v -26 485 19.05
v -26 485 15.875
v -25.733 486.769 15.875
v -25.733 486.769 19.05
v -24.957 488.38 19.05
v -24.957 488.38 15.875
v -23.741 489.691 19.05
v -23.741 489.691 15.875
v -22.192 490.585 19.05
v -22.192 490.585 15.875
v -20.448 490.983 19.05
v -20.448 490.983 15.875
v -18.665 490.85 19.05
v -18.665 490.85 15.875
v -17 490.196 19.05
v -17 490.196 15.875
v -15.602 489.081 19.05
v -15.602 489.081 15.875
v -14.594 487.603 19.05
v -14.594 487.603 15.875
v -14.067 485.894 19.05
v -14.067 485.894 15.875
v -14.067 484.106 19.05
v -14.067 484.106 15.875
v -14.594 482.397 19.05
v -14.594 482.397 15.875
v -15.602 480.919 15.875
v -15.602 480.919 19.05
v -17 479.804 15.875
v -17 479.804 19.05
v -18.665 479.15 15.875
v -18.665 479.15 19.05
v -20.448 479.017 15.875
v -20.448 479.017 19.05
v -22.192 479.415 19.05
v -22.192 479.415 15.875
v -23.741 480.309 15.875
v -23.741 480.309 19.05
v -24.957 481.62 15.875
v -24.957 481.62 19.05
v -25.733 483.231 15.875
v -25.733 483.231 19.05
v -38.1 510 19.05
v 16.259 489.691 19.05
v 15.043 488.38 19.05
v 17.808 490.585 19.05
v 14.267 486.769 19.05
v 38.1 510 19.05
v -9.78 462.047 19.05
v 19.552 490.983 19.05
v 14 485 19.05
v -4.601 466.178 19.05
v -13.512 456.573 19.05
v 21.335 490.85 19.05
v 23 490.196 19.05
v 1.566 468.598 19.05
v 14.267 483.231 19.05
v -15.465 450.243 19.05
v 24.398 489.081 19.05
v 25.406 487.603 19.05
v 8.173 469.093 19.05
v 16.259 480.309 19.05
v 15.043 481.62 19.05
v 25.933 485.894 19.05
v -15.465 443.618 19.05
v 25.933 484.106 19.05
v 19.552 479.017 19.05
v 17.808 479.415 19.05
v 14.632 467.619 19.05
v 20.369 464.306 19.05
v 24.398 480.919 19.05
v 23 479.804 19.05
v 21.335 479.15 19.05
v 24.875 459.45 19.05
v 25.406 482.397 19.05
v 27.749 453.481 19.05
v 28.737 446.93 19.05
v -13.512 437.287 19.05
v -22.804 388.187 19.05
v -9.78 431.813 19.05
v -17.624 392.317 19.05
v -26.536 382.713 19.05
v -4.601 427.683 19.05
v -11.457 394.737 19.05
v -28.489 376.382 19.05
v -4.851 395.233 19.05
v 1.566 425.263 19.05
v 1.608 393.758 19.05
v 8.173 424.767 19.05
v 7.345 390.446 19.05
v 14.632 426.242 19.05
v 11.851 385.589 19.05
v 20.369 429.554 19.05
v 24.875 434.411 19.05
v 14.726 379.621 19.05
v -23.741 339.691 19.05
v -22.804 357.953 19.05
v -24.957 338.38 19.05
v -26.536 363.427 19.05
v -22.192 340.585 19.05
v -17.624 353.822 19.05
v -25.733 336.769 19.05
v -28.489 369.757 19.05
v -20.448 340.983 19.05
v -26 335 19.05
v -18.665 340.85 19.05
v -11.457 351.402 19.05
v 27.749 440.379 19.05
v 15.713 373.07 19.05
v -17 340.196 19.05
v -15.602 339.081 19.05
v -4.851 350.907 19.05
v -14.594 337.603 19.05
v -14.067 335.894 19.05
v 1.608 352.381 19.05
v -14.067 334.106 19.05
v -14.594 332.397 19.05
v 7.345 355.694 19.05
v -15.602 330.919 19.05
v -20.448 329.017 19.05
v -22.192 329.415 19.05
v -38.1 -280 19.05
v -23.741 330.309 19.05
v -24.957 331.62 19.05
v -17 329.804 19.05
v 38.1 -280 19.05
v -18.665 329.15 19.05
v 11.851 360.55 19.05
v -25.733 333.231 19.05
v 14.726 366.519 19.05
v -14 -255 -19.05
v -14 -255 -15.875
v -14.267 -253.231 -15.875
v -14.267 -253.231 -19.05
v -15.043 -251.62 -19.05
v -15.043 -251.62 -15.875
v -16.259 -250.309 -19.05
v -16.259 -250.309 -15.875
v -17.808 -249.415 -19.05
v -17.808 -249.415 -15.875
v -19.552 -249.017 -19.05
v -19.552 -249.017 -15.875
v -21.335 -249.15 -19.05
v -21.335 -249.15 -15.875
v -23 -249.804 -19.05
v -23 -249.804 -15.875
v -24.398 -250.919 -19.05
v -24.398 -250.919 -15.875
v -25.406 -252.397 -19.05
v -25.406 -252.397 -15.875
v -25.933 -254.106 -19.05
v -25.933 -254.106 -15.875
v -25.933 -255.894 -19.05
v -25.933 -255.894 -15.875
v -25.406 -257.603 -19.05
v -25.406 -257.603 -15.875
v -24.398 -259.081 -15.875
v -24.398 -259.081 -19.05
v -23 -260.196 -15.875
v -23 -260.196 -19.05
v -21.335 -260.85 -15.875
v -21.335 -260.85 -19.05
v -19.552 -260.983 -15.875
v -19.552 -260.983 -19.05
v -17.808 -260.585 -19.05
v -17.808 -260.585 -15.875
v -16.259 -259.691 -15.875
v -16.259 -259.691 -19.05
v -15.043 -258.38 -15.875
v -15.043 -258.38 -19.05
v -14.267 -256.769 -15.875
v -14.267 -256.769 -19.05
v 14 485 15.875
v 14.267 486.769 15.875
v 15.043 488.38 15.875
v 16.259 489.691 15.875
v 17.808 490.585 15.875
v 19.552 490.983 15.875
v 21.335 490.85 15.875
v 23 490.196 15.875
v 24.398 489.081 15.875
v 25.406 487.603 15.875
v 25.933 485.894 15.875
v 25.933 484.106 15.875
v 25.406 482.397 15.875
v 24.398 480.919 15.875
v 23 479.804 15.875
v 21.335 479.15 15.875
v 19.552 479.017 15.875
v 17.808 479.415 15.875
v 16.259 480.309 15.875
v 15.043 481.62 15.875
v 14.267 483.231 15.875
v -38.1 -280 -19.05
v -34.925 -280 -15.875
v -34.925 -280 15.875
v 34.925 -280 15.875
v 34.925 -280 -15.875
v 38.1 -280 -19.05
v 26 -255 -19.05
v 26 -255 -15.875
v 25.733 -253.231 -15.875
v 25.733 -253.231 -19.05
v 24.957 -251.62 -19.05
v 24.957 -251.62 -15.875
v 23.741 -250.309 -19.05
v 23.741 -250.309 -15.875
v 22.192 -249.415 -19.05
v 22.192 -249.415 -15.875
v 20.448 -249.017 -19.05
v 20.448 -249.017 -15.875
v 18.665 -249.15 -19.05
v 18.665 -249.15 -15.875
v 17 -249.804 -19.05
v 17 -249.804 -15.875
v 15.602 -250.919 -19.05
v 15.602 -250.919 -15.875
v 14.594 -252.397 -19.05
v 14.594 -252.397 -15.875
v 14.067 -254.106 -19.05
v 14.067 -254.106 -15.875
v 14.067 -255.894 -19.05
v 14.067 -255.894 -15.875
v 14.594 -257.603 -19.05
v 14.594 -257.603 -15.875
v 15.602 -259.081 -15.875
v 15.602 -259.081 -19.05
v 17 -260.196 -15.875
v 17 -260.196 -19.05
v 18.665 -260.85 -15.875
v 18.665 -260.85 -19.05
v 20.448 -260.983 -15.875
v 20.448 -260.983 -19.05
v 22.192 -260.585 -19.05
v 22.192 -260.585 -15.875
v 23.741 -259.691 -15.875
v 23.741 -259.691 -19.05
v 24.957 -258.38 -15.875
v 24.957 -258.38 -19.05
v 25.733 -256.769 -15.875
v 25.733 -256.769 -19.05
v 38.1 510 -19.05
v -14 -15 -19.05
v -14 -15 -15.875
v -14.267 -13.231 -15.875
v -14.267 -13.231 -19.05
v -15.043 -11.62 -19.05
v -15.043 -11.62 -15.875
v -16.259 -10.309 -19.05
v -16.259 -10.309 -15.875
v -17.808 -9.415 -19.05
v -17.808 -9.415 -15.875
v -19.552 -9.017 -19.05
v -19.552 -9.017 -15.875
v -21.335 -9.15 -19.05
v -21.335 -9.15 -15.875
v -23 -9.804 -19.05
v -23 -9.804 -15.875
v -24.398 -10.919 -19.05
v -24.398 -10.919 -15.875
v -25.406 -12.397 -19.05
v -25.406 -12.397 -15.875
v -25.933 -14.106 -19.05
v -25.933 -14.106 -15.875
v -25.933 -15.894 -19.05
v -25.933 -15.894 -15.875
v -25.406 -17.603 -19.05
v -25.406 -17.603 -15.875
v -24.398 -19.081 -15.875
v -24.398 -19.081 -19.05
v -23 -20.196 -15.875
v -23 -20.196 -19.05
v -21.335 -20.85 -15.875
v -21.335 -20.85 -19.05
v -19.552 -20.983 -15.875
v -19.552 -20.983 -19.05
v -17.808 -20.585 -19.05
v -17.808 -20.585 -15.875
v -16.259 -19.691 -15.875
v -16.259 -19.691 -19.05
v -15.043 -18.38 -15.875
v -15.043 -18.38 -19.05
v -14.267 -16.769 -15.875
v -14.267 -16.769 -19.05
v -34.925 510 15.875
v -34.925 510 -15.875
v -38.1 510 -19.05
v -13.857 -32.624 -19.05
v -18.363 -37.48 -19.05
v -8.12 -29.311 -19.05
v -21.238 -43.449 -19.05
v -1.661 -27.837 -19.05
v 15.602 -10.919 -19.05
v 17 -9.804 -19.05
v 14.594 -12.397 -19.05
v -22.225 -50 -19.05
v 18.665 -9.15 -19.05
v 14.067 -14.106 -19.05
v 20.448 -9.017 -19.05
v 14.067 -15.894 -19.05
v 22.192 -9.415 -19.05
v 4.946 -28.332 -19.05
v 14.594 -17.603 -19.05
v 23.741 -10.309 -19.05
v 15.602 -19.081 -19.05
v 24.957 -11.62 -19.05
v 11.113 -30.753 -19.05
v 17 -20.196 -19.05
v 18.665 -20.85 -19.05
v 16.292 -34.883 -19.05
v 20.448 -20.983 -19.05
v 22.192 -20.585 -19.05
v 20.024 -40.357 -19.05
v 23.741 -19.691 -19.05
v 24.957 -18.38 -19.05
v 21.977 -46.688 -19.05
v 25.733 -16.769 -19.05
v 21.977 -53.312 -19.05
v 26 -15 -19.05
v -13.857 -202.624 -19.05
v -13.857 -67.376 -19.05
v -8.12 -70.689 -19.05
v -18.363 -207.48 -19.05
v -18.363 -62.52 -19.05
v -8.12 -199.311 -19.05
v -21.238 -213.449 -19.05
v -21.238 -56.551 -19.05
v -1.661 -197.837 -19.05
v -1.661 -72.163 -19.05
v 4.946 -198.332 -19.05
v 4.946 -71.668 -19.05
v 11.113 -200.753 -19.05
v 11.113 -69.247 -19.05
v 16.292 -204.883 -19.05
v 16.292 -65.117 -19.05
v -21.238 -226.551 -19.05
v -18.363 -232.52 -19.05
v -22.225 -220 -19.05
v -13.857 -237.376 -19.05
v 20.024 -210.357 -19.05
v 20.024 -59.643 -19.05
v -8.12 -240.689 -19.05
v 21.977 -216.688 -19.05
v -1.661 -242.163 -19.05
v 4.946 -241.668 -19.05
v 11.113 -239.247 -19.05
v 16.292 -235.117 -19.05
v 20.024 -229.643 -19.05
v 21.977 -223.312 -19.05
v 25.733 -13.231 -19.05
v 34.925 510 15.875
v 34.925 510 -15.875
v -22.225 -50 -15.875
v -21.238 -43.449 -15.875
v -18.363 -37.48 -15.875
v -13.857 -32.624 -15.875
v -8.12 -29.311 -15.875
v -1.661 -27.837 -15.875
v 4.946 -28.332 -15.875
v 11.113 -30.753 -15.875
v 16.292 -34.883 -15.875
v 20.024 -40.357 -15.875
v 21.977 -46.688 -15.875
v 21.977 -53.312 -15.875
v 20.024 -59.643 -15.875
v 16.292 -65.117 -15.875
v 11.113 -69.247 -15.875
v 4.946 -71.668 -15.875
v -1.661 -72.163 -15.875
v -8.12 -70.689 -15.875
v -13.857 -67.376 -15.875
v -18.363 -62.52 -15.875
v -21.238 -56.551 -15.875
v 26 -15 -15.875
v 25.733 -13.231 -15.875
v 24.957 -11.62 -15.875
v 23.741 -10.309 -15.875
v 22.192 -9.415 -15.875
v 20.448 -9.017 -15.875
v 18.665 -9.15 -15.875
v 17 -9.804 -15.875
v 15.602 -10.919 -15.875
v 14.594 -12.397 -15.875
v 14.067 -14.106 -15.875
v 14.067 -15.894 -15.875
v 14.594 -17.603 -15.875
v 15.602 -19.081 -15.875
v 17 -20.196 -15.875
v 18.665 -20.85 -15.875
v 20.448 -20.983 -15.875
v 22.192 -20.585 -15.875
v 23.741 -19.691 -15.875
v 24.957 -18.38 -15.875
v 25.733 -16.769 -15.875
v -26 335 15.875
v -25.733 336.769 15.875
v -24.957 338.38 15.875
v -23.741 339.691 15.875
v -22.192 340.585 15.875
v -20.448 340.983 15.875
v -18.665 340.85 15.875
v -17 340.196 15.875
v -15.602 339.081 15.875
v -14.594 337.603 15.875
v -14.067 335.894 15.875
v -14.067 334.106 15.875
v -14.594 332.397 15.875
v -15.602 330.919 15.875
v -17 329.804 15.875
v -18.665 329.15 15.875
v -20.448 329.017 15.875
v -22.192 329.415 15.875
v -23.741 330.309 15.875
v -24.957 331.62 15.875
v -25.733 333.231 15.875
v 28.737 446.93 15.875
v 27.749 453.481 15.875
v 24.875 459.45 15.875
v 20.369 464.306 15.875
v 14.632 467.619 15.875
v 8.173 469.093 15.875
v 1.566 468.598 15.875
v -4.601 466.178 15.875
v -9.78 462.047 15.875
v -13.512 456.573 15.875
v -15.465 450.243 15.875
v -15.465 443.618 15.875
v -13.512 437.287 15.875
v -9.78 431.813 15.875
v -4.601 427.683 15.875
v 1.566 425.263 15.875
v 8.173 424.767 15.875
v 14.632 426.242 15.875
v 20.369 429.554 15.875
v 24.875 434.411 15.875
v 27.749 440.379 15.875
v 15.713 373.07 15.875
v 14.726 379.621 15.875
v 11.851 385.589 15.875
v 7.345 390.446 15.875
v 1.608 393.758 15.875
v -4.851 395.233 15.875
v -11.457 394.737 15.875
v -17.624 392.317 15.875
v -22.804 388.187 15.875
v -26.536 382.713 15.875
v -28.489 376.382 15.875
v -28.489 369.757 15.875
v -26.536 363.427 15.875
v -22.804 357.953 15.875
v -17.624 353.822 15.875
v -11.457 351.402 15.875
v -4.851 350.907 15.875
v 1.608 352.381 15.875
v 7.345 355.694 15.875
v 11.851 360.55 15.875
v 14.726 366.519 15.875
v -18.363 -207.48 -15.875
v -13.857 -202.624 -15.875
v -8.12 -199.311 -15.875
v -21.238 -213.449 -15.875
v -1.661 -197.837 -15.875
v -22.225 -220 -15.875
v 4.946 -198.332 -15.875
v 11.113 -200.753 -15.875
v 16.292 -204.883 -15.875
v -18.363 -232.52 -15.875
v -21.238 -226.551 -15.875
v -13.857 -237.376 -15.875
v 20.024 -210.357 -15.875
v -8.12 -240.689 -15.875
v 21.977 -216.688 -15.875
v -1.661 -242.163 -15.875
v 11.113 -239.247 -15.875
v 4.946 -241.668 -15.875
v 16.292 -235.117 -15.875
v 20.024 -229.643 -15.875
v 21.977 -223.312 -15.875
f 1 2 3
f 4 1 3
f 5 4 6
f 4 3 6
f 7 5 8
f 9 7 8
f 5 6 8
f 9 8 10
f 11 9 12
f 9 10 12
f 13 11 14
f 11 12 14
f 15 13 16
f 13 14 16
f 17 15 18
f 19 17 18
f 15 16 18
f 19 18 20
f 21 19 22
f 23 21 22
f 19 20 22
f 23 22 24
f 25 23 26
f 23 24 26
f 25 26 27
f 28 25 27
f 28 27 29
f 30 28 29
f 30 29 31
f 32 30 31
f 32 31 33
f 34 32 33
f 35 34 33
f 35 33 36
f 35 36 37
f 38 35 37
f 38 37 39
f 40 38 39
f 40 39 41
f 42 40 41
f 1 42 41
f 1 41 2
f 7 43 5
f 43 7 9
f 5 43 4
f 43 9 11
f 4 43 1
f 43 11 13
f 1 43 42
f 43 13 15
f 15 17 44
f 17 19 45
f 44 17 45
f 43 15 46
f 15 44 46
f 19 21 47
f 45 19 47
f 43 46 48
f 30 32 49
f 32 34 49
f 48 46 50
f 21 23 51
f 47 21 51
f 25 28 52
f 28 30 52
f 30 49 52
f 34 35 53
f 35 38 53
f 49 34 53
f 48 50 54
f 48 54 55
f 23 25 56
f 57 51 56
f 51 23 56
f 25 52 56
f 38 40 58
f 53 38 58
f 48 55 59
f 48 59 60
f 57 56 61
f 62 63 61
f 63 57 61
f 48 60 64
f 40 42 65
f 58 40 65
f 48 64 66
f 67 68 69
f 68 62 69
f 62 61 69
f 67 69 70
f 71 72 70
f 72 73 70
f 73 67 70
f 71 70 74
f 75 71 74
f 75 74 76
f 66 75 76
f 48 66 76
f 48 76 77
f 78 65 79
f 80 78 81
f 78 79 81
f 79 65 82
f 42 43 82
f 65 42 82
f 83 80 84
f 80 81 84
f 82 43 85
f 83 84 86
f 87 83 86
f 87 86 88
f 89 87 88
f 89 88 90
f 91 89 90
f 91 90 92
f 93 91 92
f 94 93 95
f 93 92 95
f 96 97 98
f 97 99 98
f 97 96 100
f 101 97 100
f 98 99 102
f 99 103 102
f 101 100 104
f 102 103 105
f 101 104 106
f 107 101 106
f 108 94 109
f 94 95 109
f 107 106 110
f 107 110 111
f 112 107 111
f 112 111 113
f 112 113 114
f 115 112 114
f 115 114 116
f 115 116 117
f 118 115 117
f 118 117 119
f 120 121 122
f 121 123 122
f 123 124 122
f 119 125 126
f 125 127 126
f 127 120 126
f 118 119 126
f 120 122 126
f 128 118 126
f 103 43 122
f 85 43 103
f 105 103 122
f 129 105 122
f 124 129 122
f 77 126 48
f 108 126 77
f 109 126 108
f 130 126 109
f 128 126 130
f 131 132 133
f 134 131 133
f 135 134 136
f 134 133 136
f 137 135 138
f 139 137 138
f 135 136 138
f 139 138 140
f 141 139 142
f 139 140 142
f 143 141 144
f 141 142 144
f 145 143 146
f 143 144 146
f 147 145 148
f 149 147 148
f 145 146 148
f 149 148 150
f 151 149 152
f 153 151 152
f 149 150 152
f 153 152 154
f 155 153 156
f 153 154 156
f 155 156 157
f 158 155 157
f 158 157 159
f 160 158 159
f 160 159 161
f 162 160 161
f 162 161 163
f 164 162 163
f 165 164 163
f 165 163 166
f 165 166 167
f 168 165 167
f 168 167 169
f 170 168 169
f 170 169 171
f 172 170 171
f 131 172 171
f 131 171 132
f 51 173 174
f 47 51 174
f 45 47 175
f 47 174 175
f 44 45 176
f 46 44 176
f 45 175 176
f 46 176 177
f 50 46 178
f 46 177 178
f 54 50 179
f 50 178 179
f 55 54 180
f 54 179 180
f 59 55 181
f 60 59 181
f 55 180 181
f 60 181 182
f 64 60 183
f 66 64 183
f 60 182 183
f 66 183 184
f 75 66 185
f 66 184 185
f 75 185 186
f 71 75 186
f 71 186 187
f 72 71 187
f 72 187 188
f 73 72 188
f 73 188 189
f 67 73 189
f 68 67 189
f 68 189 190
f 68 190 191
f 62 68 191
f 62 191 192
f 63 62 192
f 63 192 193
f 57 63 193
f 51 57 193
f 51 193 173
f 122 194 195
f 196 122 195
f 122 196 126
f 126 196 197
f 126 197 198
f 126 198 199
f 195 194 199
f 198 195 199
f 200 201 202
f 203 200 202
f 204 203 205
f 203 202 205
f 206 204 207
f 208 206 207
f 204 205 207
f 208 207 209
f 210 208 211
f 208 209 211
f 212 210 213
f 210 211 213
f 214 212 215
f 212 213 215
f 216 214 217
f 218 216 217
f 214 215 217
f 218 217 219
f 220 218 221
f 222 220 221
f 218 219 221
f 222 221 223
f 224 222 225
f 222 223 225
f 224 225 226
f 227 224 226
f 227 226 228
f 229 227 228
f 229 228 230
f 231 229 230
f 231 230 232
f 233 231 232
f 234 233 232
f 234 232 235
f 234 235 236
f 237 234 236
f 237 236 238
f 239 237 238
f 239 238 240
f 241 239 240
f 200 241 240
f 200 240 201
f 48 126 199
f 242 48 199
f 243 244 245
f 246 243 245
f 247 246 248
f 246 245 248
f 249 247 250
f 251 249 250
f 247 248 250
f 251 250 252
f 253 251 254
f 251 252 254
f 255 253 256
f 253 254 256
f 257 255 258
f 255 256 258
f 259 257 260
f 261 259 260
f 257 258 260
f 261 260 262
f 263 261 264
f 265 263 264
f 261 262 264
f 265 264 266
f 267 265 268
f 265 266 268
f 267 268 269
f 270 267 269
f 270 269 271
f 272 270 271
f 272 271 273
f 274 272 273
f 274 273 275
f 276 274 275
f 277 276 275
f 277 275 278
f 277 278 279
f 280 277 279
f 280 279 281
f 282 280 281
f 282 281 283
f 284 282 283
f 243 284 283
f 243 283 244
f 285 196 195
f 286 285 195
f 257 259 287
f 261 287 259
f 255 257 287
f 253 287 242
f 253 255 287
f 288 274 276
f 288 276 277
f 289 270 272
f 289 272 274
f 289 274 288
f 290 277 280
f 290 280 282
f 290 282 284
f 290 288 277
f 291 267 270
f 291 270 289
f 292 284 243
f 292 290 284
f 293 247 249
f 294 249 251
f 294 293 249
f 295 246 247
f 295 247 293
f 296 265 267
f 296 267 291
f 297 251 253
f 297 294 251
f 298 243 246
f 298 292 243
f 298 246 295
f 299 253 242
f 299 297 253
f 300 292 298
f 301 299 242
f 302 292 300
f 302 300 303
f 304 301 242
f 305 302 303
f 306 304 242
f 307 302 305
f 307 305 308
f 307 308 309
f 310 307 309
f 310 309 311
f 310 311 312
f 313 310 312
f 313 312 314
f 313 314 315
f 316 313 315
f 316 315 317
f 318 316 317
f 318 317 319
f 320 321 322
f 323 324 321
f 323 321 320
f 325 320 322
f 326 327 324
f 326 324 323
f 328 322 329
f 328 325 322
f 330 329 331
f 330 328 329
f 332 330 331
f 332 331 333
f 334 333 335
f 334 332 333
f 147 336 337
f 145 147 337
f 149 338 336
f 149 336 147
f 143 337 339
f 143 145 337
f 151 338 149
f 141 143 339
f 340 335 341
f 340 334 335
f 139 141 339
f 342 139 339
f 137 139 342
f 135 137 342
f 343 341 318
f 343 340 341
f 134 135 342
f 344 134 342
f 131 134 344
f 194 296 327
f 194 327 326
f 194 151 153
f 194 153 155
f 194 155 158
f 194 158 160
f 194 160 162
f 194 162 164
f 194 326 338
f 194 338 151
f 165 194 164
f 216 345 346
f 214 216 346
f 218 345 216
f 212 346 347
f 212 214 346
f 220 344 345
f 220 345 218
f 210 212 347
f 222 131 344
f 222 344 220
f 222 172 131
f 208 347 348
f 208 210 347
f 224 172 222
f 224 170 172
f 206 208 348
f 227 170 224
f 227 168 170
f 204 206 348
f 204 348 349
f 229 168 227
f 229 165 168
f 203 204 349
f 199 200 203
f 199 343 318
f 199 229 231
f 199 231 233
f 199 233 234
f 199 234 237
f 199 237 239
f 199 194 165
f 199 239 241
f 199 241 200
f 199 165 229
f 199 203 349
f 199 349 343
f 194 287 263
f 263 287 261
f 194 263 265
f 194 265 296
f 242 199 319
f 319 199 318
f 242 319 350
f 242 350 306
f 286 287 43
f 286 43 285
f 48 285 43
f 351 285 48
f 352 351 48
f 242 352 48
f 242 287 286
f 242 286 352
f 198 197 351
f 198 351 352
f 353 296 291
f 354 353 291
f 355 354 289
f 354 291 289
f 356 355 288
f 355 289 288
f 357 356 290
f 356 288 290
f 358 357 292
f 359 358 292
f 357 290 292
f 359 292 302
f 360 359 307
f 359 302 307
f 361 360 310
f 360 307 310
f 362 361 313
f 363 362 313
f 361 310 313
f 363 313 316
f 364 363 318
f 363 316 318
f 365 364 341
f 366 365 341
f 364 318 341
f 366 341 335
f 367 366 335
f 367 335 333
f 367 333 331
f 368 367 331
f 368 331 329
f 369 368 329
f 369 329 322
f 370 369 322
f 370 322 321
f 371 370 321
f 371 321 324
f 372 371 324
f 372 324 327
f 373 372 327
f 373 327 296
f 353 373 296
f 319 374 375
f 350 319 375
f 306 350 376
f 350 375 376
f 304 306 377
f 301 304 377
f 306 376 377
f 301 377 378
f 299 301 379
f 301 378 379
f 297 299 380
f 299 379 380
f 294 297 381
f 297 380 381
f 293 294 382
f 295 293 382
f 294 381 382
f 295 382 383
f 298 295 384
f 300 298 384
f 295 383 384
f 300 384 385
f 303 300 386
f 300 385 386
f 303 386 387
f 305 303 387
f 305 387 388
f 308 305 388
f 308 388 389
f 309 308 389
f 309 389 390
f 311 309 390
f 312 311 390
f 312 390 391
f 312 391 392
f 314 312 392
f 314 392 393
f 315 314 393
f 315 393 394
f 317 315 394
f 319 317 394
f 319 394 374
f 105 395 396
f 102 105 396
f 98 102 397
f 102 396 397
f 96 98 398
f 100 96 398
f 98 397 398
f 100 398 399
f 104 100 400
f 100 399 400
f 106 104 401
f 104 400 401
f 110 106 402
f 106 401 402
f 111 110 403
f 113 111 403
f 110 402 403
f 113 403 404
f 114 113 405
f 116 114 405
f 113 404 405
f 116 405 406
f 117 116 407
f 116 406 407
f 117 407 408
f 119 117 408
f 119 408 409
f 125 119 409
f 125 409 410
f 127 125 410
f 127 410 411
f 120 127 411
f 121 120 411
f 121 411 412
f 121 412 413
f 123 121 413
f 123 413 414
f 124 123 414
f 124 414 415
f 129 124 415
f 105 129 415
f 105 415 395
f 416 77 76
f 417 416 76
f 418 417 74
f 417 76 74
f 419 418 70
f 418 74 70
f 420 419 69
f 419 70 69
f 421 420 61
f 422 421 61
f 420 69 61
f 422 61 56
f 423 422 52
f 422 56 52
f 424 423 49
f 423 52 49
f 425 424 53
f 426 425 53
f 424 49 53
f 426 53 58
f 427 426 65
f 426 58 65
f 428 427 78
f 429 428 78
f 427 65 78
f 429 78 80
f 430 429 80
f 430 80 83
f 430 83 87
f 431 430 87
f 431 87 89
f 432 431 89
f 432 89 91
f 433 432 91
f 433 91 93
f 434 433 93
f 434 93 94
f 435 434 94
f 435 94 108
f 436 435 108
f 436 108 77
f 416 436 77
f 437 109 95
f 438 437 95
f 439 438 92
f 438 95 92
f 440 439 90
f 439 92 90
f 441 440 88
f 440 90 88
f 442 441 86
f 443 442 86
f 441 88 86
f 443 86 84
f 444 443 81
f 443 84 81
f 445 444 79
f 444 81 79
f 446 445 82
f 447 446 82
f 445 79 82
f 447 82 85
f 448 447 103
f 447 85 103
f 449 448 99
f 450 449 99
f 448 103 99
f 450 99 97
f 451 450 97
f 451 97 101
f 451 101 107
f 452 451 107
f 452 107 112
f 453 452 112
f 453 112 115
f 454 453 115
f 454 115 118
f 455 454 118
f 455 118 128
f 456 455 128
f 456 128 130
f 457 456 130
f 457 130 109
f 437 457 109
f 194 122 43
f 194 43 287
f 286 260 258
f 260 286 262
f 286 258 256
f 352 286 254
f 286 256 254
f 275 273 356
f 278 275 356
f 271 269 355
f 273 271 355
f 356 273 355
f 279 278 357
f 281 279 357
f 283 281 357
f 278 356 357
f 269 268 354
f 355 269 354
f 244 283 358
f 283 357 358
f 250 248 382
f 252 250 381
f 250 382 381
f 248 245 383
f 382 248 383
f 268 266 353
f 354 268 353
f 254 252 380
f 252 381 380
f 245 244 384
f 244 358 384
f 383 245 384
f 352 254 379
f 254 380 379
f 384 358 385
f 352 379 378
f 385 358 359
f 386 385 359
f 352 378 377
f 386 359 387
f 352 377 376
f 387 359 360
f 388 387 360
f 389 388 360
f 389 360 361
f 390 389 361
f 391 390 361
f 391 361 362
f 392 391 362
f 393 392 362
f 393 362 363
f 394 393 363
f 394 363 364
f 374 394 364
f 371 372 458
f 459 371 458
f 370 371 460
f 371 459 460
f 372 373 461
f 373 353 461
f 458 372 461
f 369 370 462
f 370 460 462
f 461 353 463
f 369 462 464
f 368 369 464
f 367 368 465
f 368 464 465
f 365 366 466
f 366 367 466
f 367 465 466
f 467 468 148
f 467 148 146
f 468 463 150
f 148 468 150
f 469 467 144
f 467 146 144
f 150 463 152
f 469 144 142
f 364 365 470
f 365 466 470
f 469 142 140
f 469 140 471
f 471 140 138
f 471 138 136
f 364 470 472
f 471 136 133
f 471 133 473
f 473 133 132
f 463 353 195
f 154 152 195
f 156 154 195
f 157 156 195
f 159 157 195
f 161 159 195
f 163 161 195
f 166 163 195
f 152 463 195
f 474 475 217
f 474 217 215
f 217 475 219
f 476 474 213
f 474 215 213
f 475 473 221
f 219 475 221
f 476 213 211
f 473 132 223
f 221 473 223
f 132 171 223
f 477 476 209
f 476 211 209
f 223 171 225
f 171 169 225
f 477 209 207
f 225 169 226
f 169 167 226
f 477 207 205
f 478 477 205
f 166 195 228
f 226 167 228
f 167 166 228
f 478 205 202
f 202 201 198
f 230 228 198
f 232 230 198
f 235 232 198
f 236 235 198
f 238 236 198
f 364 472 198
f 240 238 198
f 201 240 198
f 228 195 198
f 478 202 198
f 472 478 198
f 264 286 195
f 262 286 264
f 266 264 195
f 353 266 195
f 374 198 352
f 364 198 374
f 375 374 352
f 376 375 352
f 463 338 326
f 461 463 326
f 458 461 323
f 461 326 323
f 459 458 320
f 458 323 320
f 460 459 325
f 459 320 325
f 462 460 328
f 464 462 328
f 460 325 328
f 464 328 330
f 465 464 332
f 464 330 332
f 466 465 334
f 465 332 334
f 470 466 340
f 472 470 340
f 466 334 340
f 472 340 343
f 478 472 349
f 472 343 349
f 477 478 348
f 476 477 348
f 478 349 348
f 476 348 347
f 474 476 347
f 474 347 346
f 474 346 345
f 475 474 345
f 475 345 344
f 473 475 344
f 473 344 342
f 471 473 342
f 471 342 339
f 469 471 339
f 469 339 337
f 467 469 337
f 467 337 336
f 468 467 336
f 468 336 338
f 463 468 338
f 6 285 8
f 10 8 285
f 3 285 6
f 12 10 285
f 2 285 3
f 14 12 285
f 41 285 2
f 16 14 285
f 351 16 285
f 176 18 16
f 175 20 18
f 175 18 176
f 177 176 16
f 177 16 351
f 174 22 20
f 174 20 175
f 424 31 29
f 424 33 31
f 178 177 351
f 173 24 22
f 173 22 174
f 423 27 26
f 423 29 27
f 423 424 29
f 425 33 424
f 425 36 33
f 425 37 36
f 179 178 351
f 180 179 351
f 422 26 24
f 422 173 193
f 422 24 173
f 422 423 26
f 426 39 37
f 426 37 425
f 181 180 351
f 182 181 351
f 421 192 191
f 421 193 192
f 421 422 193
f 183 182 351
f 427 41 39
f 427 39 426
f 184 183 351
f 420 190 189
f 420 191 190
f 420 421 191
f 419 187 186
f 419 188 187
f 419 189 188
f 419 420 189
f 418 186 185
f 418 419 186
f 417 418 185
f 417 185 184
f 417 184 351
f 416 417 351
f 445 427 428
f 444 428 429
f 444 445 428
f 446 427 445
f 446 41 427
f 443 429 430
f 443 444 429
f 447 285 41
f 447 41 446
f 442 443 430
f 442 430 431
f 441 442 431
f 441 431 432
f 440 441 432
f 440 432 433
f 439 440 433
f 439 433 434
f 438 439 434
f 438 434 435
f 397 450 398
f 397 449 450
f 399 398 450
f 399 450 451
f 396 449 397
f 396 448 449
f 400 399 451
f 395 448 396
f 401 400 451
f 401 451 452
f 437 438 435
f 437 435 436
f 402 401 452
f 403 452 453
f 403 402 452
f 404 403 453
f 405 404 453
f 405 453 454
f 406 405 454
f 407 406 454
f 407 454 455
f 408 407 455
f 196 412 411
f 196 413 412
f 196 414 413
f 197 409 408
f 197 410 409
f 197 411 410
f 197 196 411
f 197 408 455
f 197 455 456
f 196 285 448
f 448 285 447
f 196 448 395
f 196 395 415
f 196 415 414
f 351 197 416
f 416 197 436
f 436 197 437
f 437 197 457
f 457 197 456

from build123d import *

# Parameters (mm, degrees)
EXTRUDE_THIN1_DEPTH            = 510
EXTRUDE_THIN1_DEPTH_BACK       = 280
SKETCH1_W                      = 76.2
SKETCH1_H                      = 38.1
SKETCH1_W_2                    = 69.85
SKETCH1_H_2                    = 31.75
CUT_EXTRUDE1_REACH             = 514.838
SKETCH6_R                      = 22.225
F_12_0_12_DIAMETER_HOLE2_D     = 12
F_12_0_12_DIAMETER_HOLE2_DEPTH = 3.175
F_12_0_12_DIAMETER_HOLE1_D     = 12
F_12_0_12_DIAMETER_HOLE1_DEPTH = 3.175
CUT_EXTRUDE2_REACH             = 514.838
SKETCH7_R                      = 22.225


with BuildPart() as part:
    # Sketch1 → Extrude-Thin1 (new, two sides: drawn at the far end of the back side and taken through both)
    with BuildSketch(Plane(origin=(0, 0, 0), x_dir=(1, 0, 0), z_dir=(0, 1, 0)).offset(-EXTRUDE_THIN1_DEPTH_BACK)):
        Rectangle(SKETCH1_W, SKETCH1_H)
        Rectangle(SKETCH1_W_2, SKETCH1_H_2, mode=Mode.SUBTRACT)
    extrude(amount=EXTRUDE_THIN1_DEPTH + EXTRUDE_THIN1_DEPTH_BACK)

    # Sketch6 → Cut-Extrude1 (cut, up to next)
    with BuildSketch(Plane.XY.offset(19.05), mode=Mode.PRIVATE) as cut_extrude1_sk1:
        with Locations((6.511806663, 446.930290738)):
            Circle(SKETCH6_R)
    cut_extrude1_tool1 = extrude(cut_extrude1_sk1.sketch, amount=-CUT_EXTRUDE1_REACH, mode=Mode.PRIVATE) & part.part
    # Sketch6 → Cut-Extrude1 (cut, up to next)
    with BuildSketch(Plane.XY.offset(19.05), mode=Mode.PRIVATE) as cut_extrude1_sk2:
        with Locations((-6.511806663, 373.069709262)):
            Circle(SKETCH6_R)
    cut_extrude1_tool2 = extrude(cut_extrude1_sk2.sketch, amount=-CUT_EXTRUDE1_REACH, mode=Mode.PRIVATE) & part.part
    add(cut_extrude1_tool1.solids().sort_by_distance((6.511807, 446.930291, 19.05))[0], mode=Mode.SUBTRACT)
    add(cut_extrude1_tool2.solids().sort_by_distance((-6.511807, 373.069709, 19.05))[0], mode=Mode.SUBTRACT)

    # Ø12.0 (12) Diameter Hole2
    with Locations(Plane.XY.offset(19.05)):
        with Locations((-20, 485), (20, 485), (-20, 335)):
            Hole(F_12_0_12_DIAMETER_HOLE2_D / 2, depth=F_12_0_12_DIAMETER_HOLE2_DEPTH)

    # Ø12.0 (12) Diameter Hole1
    with Locations(Plane(origin=(0, 0, -19.05), x_dir=(-1, 0, 0), z_dir=(0, 0, -1))):
        with Locations((-20, -15), (20, -255), (-20, -255), (20, -15)):
            Hole(F_12_0_12_DIAMETER_HOLE1_D / 2, depth=F_12_0_12_DIAMETER_HOLE1_DEPTH)

    # Sketch7 → Cut-Extrude2 (cut, up to next)
    with BuildSketch(Plane(origin=(0, 0, -19.05), x_dir=(-1, 0, 0), z_dir=(0, 0, -1)), mode=Mode.PRIVATE) as cut_extrude2_sk1:
        with Locations((0, -50)):
            Circle(SKETCH7_R)
    cut_extrude2_tool1 = extrude(cut_extrude2_sk1.sketch, amount=-CUT_EXTRUDE2_REACH, mode=Mode.PRIVATE) & part.part
    # Sketch7 → Cut-Extrude2 (cut, up to next)
    with BuildSketch(Plane(origin=(0, 0, -19.05), x_dir=(-1, 0, 0), z_dir=(0, 0, -1)), mode=Mode.PRIVATE) as cut_extrude2_sk2:
        with Locations((0, -220)):
            Circle(SKETCH7_R)
    cut_extrude2_tool2 = extrude(cut_extrude2_sk2.sketch, amount=-CUT_EXTRUDE2_REACH, mode=Mode.PRIVATE) & part.part
    add(cut_extrude2_tool1.solids().sort_by_distance((0, -50, -19.05))[0], mode=Mode.SUBTRACT)
    add(cut_extrude2_tool2.solids().sort_by_distance((0, -220, -19.05))[0], mode=Mode.SUBTRACT)


solid = part.part
